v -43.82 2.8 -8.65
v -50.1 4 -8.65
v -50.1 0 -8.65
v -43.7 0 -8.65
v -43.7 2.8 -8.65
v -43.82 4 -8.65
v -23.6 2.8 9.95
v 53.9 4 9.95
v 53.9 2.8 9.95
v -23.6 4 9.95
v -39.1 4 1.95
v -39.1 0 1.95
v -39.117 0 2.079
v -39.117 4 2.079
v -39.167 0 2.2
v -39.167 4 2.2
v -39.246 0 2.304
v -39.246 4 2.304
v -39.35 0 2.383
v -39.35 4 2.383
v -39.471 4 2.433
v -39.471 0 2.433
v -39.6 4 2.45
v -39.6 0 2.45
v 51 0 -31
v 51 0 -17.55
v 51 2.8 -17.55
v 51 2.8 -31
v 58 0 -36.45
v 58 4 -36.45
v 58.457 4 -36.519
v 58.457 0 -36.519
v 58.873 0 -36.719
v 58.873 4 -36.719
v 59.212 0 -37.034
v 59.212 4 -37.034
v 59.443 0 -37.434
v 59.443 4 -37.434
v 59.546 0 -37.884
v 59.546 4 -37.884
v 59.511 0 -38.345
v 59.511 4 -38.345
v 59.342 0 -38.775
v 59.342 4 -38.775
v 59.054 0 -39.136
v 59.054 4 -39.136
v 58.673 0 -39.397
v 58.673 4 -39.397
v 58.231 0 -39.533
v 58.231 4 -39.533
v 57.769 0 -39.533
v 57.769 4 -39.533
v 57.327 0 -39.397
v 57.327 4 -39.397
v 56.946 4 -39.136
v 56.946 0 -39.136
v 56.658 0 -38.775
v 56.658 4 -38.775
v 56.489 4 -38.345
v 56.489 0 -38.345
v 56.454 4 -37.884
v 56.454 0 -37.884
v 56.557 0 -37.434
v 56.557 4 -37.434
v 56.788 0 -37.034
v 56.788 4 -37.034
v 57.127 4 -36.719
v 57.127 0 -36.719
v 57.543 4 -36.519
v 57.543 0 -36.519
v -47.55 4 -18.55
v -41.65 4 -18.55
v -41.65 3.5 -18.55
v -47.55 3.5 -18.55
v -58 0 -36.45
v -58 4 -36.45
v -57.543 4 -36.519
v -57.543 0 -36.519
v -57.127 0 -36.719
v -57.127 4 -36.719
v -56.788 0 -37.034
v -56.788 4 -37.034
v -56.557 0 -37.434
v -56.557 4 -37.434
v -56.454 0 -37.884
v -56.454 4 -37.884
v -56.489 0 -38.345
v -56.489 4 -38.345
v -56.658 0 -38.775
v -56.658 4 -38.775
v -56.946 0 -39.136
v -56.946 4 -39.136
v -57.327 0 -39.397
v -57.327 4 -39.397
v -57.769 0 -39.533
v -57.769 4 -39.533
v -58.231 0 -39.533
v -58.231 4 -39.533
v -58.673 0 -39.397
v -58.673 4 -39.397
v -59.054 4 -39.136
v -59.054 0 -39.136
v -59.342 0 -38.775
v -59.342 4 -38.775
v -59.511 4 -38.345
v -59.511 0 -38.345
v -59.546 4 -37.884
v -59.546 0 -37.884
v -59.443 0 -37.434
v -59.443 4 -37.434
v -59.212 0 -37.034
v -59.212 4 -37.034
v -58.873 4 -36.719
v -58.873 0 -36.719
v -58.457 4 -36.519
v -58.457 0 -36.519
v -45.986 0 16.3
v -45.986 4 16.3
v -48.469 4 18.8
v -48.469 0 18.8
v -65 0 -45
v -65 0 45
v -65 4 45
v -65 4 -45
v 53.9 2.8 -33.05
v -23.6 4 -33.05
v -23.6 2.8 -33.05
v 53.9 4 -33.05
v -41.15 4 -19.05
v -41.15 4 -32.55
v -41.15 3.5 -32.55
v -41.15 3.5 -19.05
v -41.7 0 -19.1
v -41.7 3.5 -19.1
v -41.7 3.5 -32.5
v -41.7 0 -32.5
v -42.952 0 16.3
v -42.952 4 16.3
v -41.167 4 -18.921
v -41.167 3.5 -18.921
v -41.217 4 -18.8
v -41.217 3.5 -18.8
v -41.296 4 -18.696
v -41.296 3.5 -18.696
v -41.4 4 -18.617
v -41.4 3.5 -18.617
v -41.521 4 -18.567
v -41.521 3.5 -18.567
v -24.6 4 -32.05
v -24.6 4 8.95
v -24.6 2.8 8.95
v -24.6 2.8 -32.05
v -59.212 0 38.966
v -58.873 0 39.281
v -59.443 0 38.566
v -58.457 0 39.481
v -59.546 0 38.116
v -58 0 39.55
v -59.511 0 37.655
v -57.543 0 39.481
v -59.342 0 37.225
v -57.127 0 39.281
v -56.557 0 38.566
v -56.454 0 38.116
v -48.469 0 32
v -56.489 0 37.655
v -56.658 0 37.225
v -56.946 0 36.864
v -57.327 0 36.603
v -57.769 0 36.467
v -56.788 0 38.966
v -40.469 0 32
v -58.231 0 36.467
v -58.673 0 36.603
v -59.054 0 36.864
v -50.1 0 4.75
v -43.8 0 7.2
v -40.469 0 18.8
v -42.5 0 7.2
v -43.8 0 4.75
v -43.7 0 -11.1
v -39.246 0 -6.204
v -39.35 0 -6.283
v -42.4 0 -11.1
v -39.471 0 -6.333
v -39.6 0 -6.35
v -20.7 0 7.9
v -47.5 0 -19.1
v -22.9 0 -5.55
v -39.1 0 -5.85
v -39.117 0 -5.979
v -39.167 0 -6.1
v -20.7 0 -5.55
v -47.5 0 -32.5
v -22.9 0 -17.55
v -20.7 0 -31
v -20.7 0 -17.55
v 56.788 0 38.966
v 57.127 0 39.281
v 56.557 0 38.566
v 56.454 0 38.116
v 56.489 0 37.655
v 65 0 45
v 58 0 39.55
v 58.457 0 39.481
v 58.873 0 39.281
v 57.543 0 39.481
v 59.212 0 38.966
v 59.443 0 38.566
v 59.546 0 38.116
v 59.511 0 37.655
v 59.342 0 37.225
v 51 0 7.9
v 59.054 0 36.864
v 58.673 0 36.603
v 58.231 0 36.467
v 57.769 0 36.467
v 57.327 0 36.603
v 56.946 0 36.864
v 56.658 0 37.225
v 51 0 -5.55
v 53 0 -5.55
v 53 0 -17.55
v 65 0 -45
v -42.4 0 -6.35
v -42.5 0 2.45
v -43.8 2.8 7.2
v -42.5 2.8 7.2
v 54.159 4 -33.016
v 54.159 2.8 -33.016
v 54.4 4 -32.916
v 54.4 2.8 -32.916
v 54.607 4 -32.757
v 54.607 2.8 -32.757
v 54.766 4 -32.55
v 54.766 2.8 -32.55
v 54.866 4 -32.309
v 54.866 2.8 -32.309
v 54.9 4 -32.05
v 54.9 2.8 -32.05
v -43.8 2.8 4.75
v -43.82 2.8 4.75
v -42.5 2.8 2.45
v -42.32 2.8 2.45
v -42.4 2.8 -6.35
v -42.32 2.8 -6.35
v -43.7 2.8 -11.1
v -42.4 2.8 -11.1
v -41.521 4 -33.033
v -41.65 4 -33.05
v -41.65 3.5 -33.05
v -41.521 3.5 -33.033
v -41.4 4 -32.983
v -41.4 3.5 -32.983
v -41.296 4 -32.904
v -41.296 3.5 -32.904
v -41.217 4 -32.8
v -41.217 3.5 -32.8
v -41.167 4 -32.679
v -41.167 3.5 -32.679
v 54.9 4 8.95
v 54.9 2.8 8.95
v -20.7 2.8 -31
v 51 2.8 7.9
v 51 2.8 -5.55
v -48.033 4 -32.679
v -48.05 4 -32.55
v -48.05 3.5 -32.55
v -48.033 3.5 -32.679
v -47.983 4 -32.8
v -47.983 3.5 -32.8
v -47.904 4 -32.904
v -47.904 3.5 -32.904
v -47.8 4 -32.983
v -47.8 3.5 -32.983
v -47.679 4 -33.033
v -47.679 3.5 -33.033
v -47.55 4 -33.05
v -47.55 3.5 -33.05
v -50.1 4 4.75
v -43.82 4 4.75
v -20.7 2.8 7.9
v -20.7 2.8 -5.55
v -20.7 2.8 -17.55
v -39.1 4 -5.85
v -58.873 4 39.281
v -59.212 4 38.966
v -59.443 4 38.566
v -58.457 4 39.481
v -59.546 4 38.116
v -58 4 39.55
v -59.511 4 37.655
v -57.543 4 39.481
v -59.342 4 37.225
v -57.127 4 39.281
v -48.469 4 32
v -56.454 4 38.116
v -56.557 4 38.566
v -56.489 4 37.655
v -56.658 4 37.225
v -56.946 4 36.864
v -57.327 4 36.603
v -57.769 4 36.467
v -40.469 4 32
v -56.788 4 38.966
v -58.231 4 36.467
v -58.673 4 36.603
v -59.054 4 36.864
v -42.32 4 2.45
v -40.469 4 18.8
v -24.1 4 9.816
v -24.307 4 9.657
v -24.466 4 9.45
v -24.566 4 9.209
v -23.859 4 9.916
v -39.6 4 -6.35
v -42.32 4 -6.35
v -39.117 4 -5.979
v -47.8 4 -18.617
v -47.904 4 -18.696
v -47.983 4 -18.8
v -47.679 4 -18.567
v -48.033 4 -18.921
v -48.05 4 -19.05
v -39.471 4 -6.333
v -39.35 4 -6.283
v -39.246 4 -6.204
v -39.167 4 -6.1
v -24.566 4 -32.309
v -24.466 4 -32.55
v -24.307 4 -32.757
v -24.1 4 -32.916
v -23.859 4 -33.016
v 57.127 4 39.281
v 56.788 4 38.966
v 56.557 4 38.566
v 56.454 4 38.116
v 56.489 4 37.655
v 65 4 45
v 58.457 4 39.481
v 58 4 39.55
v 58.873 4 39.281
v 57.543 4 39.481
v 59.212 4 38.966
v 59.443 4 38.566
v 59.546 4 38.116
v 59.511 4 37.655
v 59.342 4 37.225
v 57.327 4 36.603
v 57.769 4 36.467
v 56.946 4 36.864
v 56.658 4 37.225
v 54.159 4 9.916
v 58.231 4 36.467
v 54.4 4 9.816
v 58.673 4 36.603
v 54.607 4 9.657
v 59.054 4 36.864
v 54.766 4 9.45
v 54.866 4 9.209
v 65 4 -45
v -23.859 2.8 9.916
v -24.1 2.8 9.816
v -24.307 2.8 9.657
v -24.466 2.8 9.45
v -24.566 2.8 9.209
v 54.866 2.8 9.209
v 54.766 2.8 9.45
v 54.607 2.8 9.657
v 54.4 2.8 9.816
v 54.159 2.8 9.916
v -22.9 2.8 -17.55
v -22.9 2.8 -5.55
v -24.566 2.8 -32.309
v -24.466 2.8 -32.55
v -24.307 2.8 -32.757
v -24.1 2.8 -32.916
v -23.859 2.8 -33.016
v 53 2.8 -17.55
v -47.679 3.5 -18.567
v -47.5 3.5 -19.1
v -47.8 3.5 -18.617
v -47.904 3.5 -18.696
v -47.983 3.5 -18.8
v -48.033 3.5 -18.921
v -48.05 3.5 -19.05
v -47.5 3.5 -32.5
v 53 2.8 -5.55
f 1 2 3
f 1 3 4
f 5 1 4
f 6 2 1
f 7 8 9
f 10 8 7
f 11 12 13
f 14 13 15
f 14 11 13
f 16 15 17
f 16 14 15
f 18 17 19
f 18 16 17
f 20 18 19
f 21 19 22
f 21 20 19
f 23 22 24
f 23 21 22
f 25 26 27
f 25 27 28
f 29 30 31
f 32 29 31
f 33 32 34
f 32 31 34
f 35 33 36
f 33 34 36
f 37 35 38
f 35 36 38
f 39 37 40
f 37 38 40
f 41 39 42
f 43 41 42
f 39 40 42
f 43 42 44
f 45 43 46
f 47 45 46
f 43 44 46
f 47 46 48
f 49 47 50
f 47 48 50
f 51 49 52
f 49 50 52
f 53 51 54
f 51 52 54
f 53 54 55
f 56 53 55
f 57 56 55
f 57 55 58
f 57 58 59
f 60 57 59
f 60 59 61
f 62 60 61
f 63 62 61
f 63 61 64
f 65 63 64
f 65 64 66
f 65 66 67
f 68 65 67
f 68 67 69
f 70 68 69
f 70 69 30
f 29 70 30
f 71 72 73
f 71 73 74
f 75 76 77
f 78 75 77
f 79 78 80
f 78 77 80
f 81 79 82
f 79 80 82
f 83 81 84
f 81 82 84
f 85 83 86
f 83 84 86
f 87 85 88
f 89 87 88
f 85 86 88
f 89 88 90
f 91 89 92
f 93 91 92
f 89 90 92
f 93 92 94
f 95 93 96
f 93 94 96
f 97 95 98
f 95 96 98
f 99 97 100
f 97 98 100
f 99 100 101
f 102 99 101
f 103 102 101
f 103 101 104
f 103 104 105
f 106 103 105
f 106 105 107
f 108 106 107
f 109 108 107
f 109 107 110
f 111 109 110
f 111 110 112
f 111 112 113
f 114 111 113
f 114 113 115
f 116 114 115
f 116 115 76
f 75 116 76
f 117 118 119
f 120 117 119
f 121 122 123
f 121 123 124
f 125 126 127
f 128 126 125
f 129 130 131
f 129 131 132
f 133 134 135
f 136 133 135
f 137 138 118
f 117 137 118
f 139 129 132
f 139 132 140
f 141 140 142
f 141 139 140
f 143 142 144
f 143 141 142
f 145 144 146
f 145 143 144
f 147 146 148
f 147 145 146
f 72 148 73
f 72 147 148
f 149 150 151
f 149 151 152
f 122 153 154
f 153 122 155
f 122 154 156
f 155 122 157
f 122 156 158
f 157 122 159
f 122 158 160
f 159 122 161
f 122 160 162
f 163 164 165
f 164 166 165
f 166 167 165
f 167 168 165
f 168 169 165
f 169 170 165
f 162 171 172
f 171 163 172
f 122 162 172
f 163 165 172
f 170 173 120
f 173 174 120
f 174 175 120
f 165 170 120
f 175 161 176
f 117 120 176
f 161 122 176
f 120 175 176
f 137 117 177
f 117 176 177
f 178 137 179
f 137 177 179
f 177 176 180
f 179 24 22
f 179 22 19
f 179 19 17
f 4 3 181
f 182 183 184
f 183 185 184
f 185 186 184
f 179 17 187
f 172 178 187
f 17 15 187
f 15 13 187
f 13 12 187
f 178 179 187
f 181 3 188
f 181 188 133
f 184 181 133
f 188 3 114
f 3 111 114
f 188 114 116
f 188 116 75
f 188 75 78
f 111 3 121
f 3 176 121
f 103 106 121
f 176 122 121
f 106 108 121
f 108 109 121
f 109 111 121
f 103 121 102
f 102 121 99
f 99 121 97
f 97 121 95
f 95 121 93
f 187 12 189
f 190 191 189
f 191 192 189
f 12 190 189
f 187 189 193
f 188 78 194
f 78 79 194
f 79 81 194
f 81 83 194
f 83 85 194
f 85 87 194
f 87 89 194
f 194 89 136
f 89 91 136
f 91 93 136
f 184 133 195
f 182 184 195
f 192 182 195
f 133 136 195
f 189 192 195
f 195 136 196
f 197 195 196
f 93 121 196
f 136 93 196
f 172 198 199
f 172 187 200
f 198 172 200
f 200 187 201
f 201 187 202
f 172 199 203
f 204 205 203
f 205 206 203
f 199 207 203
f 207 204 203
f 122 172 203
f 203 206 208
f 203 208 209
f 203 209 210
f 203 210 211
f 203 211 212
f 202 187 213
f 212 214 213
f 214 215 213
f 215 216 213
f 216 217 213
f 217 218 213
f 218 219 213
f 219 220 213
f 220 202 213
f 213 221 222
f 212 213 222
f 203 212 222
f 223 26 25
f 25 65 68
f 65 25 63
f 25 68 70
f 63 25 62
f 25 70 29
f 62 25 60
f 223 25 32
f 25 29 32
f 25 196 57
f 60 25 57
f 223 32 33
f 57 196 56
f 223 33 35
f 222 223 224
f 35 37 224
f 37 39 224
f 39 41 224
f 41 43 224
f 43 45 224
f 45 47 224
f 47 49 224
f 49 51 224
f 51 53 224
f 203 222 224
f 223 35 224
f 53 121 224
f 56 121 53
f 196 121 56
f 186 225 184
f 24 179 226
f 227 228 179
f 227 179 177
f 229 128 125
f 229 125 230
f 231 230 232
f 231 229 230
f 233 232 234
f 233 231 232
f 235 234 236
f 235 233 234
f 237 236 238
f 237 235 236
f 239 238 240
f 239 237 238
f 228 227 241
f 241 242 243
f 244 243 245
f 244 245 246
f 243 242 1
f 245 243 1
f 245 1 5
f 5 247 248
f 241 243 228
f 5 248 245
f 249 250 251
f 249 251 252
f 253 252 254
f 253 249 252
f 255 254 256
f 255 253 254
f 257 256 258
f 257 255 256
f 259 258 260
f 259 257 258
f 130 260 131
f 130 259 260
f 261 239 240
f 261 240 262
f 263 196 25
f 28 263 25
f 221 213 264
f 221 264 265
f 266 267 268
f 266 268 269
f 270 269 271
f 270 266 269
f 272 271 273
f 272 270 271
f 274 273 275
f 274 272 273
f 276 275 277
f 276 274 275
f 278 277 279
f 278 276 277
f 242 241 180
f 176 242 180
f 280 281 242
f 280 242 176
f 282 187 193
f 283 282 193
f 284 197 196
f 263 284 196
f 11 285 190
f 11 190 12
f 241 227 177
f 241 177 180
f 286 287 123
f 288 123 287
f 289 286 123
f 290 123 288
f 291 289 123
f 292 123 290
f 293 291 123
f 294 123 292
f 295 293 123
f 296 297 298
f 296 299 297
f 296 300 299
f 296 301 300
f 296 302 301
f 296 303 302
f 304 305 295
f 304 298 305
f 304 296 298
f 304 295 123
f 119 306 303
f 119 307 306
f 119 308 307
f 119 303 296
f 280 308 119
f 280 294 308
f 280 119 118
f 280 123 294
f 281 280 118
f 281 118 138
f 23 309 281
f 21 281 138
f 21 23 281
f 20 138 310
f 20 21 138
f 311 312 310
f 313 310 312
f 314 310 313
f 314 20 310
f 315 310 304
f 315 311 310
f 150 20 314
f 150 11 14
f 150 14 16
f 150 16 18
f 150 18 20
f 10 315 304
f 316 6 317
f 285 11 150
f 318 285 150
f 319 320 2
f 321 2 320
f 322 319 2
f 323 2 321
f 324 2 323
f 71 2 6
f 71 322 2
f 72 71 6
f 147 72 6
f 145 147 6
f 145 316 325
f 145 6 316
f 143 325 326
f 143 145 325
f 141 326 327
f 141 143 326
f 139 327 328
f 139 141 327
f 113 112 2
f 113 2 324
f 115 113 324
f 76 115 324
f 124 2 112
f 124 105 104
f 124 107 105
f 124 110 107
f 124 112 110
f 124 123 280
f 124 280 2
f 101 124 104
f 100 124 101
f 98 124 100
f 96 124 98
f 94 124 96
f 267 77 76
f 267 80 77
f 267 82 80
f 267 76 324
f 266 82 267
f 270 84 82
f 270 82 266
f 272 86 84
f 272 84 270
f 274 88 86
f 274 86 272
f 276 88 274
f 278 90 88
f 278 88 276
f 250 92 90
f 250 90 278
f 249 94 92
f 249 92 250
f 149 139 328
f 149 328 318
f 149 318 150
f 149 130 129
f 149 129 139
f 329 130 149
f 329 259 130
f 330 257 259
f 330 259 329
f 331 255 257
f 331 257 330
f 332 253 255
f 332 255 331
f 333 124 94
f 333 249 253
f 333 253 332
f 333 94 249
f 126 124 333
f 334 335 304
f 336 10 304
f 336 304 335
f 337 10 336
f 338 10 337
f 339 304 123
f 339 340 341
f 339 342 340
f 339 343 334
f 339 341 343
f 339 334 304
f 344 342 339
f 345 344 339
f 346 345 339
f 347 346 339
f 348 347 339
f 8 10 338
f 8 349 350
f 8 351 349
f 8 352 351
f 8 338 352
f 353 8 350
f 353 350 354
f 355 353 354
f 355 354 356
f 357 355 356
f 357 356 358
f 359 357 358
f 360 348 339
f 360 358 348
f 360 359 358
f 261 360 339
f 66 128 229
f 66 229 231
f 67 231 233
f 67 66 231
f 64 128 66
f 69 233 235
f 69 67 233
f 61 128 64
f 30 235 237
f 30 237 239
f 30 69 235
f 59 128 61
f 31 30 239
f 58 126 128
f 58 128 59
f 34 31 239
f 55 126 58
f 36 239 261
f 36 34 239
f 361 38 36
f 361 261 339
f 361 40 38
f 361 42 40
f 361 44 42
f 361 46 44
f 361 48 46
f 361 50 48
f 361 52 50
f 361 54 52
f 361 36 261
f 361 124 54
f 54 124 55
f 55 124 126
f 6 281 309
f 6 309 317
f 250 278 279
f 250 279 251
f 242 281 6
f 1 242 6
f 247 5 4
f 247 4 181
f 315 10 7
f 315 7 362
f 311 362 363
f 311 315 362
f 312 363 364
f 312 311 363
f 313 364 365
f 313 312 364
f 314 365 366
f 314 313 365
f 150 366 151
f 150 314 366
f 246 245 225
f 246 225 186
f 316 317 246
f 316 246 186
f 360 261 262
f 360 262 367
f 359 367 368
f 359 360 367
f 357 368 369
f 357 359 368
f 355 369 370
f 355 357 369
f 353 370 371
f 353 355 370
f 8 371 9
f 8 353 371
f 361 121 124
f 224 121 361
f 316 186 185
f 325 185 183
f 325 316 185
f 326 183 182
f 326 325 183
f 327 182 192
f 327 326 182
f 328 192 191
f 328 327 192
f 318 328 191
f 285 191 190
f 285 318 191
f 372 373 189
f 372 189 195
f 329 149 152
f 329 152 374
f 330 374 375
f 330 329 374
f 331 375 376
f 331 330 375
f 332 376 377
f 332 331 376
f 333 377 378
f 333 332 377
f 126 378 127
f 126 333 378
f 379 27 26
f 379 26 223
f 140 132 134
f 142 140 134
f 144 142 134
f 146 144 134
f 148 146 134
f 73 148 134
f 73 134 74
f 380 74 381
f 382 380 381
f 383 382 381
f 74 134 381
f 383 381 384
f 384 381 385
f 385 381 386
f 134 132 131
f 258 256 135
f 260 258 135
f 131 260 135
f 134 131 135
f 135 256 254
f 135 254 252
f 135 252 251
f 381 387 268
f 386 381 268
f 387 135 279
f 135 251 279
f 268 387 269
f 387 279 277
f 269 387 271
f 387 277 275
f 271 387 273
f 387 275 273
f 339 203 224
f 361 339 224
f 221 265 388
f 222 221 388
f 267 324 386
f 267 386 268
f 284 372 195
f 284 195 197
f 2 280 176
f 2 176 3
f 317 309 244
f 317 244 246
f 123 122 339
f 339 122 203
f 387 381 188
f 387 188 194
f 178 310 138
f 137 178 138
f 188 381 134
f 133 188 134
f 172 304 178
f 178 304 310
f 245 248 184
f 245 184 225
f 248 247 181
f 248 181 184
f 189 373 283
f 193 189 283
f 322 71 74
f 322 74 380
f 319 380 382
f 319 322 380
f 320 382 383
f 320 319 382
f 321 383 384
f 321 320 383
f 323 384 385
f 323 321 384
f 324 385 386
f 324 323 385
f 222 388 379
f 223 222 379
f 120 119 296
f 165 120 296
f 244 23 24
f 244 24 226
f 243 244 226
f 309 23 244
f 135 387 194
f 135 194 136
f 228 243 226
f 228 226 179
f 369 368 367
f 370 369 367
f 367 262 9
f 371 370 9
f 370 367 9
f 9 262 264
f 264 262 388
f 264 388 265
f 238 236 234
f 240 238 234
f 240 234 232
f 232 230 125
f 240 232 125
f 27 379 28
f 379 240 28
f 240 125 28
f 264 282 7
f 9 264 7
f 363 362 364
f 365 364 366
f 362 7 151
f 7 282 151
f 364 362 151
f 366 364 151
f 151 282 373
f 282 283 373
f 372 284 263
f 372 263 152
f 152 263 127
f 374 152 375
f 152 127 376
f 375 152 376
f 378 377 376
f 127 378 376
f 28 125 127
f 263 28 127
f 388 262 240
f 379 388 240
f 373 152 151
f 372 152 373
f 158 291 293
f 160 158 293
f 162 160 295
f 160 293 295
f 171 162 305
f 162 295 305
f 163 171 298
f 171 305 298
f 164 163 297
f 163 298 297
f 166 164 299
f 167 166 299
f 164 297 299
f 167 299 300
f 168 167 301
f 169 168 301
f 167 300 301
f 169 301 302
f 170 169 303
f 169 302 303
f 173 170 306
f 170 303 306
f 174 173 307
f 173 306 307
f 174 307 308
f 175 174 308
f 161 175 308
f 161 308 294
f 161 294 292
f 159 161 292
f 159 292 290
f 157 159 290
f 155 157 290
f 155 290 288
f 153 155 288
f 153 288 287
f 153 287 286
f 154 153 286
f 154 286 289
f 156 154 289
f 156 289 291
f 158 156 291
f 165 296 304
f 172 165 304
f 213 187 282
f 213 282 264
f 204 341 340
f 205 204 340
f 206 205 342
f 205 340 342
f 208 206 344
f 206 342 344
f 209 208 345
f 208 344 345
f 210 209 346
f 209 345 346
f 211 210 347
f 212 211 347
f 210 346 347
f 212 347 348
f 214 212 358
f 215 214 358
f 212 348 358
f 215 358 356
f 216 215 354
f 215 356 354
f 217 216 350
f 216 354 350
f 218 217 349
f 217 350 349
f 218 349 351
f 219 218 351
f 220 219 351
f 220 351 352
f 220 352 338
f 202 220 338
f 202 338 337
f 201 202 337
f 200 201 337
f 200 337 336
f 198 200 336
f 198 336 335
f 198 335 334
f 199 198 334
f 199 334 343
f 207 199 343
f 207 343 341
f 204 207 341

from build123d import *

# Parameters (mm, degrees)
SKETCH_1_W             = 130
SKETCH_1_H             = 90
SKETCH_1_W_2           = 71.7
SKETCH_1_H_2           = 38.9
EXTRUDE_399_DEPTH      = 4
CUT_EXTRUDE_706_DEPTH  = 1.2
SKETCH_3_W             = 5.8
SKETCH_3_H             = 13.4
USB_DEPTH              = 80.158069709
SKETCH_4_W             = 4.4
SKETCH_4_H             = 12
CUT_EXTRUDE_1602_DEPTH = 80.106510478
USB_2_DEPTH            = 0.5
SKETCH_8_W             = 1.5
SKETCH_8_H             = 18.480447519
USB_3_DEPTH            = 1.2
XT60_DEPTH             = 80.158069709
SKETCH_9_R             = 1.55
CUT_EXTRUDE_6_DEPTH    = 80.158069709


with BuildPart() as part:
    # Эскиз1 → Extrude 399 (new body)
    with BuildSketch(Plane(origin=(0, 0, 0), x_dir=(1, 0, 0), z_dir=(0, 1, 0))):
        Rectangle(SKETCH_1_W, SKETCH_1_H)
        with Locations((15.15, 11.55)):
            Rectangle(SKETCH_1_W_2, SKETCH_1_H_2, mode=Mode.SUBTRACT)
    extrude(amount=EXTRUDE_399_DEPTH)

    # Эскиз2 → Cut-Extrude 706 (cut)
    with BuildSketch(Plane(origin=(0, 4, 0), x_dir=(1, 0, 0), z_dir=(0, 1, 0))):
        with BuildLine():
            Line((-23.6, 33.05), (53.9, 33.05))
            ThreePointArc((53.9, 33.05), (54.607106781, 32.757106781), (54.9, 32.05))
            Line((54.9, 32.05), (54.9, -8.95))
            ThreePointArc((54.9, -8.95), (54.607106781, -9.657106781), (53.9, -9.95))
            Line((53.9, -9.95), (-23.6, -9.95))
            ThreePointArc((-23.6, -9.95), (-24.307106781, -9.657106781), (-24.6, -8.95))
            Line((-24.6, -8.95), (-24.6, 32.05))
            ThreePointArc((-24.6, 32.05), (-24.307106781, 32.757106781), (-23.6, 33.05))
        make_face()
    extrude(amount=-CUT_EXTRUDE_706_DEPTH, mode=Mode.SUBTRACT)

    # Эскиз3 → USB (cut, through all)
    with BuildSketch(Plane(origin=(0, 4, 0), x_dir=(1, 0, 0), z_dir=(0, 1, 0))):
        with BuildLine():
            Line((-50.1, -4.75), (-50.1, 8.65))
            Line((-50.1, 8.65), (-43.7, 8.65))
            Line((-43.7, 8.65), (-43.7, 11.1))
            Line((-43.7, 11.1), (-42.4, 11.1))
            Line((-42.4, 11.1), (-42.4, 6.35))
            Line((-42.4, 6.35), (-39.6, 6.35))
            ThreePointArc((-39.6, 6.35), (-39.246446609, 6.203553391), (-39.1, 5.85))
            Line((-39.1, 5.85), (-39.1, -1.95))
            ThreePointArc((-39.1, -1.95), (-39.246446609, -2.303553391), (-39.6, -2.45))
            Line((-39.6, -2.45), (-42.5, -2.45))
            Line((-42.5, -2.45), (-42.5, -7.2))
            Line((-42.5, -7.2), (-43.8, -7.2))
            Line((-43.8, -7.2), (-43.8, -4.75))
            Line((-43.8, -4.75), (-50.1, -4.75))
        make_face()
        with Locations((-44.6, 25.8)):
            Rectangle(SKETCH_3_W, SKETCH_3_H)
    extrude(amount=-USB_DEPTH, mode=Mode.SUBTRACT)

    # Эскиз4 → Cut-Extrude 1602 (cut, through all)
    with BuildSketch(Plane(origin=(0, 2.8, 0), x_dir=(1, 0, 0), z_dir=(0, 1, 0))):
        with Locations((-20.7, 11.55)):
            Rectangle(SKETCH_4_W, SKETCH_4_H)
        with Locations((50.8, 11.55)):
            Rectangle(SKETCH_4_W, SKETCH_4_H)
    extrude(amount=-CUT_EXTRUDE_1602_DEPTH, mode=Mode.SUBTRACT)

    # Эскиз7 → USB 2 (cut)
    with BuildSketch(Plane(origin=(0, 4, 0), x_dir=(1, 0, 0), z_dir=(0, 1, 0))):
        with BuildLine():
            Line((-47.55, 33.05), (-41.65, 33.05))
            ThreePointArc((-41.65, 33.05), (-41.296446609, 32.903553391), (-41.15, 32.55))
            Line((-41.15, 32.55), (-41.15, 19.05))
            ThreePointArc((-41.15, 19.05), (-41.296446609, 18.696446609), (-41.65, 18.55))
            Line((-41.65, 18.55), (-47.55, 18.55))
            ThreePointArc((-47.55, 18.55), (-47.903553391, 18.696446609), (-48.05, 19.05))
            Line((-48.05, 19.05), (-48.05, 32.55))
            ThreePointArc((-48.05, 32.55), (-47.903553391, 32.903553391), (-47.55, 33.05))
        make_face()
    extrude(amount=-USB_2_DEPTH, mode=Mode.SUBTRACT)

    # Эскиз8 → USB 3 (add)
    with BuildSketch(Plane(origin=(0, 4, 0), x_dir=(1, 0, 0), z_dir=(0, 1, 0))):
        with Locations((-43.069744148, 1.932070249)):
            Rectangle(SKETCH_8_W, SKETCH_8_H)
    extrude(amount=-USB_3_DEPTH)

    # Эскиз5 → XT60 (cut, through all)
    with BuildSketch(Plane(origin=(0, 4, 0), x_dir=(1, 0, 0), z_dir=(0, 1, 0))):
        Polygon((-48.468705951, -32), (-40.468705951, -32), (-40.468705951, -18.8), (-42.951848706, -16.3), (-45.985563195, -16.3), (-48.468705951, -18.8), align=None)
    extrude(amount=-XT60_DEPTH, mode=Mode.SUBTRACT)

    # Эскиз9 → Вырез-Вытянуть6 (cut, through all)
    with BuildSketch(Plane(origin=(0, 4, 0), x_dir=(1, 0, 0), z_dir=(0, 1, 0))):
        with Locations(Location((-58, 38, 0), (0, 0, 270))):
            Circle(SKETCH_9_R)
        with Locations(Location((58, 38, 0), (0, 0, 270))):
            Circle(SKETCH_9_R)
        with Locations(Location((-58, -38, 0), (0, 0, 270))):
            Circle(SKETCH_9_R)
        with Locations(Location((58, -38, 0), (0, 0, 270))):
            Circle(SKETCH_9_R)
    extrude(amount=-CUT_EXTRUDE_6_DEPTH, mode=Mode.SUBTRACT)


solid = part.part
